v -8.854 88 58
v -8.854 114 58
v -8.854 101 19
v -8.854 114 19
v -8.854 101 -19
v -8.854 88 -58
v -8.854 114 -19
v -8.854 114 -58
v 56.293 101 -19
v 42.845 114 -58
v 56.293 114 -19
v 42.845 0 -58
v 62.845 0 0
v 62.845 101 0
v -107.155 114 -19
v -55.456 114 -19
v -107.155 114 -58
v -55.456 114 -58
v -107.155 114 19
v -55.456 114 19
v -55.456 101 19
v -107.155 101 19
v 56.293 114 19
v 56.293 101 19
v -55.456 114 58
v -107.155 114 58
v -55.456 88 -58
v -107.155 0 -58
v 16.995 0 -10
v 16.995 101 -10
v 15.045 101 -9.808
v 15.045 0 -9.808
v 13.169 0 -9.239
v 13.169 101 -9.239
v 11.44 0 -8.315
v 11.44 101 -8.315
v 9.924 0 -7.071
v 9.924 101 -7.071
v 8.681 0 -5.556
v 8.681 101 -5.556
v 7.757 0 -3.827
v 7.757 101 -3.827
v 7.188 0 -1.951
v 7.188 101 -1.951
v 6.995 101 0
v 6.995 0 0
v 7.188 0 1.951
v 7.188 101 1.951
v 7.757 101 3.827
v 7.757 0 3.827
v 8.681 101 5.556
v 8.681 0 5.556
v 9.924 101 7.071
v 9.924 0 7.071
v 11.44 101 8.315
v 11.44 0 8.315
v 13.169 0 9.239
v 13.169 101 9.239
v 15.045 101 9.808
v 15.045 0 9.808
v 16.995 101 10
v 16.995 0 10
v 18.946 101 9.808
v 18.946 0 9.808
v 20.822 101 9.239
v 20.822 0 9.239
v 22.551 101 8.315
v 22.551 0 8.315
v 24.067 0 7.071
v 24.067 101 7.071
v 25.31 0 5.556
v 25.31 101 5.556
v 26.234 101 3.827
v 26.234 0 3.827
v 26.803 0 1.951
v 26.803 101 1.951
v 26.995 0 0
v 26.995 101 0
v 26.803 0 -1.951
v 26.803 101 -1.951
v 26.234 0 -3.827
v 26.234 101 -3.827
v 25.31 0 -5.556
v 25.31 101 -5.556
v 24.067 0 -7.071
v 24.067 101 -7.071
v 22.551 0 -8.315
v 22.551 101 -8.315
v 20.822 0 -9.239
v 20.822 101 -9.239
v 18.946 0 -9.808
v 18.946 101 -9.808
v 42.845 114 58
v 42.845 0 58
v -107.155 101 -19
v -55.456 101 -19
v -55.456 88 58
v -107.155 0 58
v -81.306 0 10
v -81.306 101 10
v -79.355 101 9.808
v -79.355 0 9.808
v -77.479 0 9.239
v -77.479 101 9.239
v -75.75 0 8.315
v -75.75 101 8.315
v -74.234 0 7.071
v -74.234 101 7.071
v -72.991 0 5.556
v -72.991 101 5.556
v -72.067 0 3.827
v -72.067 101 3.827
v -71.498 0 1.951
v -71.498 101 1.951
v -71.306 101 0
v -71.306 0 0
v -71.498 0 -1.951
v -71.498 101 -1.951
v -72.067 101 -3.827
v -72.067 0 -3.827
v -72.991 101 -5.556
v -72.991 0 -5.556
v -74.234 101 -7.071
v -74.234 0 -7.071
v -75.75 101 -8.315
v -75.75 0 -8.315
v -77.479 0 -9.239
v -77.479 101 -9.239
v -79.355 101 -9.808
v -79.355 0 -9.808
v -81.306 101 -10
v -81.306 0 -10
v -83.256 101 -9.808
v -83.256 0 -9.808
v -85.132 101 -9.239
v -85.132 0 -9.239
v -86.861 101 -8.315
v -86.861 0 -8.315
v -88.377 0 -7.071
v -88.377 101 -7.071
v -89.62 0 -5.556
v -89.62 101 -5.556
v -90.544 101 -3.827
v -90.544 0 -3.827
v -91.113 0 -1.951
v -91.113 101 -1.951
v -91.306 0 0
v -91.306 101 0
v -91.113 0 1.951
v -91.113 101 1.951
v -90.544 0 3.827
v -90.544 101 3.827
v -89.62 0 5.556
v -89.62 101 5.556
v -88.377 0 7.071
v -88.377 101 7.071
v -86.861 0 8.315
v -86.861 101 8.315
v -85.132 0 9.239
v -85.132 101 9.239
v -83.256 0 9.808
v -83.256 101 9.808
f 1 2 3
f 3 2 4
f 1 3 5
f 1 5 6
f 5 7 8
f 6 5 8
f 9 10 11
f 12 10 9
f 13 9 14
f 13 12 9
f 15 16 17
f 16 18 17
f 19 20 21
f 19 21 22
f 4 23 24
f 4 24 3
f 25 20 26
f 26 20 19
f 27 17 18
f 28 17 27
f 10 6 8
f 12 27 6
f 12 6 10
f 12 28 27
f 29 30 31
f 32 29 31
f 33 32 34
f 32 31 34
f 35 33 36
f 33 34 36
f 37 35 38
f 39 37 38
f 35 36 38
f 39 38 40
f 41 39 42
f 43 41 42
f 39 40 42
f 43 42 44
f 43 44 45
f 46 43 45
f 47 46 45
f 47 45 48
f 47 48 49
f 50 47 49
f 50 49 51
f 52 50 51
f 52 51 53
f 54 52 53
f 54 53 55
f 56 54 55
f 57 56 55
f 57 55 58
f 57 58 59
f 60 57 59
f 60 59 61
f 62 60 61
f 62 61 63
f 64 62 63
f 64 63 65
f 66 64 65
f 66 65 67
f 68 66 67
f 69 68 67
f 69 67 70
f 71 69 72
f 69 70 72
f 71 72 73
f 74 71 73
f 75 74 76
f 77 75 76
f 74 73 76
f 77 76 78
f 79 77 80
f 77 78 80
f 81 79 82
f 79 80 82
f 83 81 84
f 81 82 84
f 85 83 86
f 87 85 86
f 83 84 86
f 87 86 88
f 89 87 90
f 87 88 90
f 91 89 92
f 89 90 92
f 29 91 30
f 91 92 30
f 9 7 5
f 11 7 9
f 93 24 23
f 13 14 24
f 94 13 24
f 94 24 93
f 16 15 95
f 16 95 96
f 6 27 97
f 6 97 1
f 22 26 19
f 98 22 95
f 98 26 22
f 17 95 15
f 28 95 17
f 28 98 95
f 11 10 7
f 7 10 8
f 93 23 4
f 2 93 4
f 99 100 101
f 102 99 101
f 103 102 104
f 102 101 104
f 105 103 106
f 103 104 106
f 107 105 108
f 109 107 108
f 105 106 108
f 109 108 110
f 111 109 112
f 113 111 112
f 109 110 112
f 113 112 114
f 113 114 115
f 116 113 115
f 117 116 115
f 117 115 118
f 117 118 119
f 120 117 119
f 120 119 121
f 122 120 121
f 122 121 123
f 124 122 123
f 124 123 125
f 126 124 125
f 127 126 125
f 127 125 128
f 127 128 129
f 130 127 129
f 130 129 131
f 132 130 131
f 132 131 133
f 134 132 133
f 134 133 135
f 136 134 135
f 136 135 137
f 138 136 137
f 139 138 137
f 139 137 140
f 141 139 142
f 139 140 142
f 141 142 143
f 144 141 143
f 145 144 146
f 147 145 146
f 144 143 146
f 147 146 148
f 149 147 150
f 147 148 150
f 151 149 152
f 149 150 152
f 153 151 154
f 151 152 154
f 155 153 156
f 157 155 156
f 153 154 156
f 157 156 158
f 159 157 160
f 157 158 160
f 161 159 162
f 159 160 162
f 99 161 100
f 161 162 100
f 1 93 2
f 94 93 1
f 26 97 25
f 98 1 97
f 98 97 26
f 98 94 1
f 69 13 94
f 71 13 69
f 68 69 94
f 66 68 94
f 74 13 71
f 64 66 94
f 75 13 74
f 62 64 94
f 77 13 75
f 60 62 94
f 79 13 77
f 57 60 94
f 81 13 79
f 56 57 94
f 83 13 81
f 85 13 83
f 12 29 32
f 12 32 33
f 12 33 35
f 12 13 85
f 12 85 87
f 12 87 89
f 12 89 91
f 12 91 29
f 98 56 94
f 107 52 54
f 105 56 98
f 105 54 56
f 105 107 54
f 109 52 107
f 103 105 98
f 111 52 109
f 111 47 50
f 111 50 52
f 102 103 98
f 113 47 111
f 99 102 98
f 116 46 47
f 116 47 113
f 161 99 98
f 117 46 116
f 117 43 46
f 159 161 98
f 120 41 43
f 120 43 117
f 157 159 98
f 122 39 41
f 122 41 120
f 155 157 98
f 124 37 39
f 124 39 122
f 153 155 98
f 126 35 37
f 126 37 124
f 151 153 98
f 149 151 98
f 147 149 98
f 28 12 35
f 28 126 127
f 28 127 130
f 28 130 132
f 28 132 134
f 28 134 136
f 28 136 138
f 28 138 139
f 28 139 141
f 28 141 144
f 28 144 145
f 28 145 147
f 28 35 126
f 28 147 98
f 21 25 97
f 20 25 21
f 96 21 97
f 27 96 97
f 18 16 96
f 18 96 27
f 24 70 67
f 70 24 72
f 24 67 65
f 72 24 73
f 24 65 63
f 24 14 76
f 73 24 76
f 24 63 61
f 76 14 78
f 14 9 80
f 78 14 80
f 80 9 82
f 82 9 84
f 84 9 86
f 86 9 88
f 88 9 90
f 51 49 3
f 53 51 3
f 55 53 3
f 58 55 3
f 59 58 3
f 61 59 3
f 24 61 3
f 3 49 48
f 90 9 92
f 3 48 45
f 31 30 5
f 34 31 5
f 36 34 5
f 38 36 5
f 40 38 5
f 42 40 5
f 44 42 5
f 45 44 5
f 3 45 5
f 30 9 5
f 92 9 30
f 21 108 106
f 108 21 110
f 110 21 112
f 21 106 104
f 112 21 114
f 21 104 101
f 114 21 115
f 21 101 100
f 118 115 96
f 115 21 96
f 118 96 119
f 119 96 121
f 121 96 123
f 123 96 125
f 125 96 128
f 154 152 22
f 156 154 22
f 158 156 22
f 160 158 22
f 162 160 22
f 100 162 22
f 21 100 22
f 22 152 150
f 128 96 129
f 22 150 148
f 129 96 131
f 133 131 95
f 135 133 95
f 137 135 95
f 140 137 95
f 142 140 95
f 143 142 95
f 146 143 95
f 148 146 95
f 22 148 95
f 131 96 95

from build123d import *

# Parameters (mm, degrees)
ESTRUSIONE_ESTRUSIONE1_DEPTH = 114
TAGLIO_ESTRUSIONE3_DEPTH     = 13
SCHIZZO6_W                   = 46.601982298
SCHIZZO6_H                   = 116
TAGLIO_ESTRUSIONE4_DEPTH     = 26
SCHIZZO7_R                   = 10
TAGLIO_ESTRUSIONE5_DEPTH     = 159.263069137


with BuildPart() as part:
    # Schizzo1 → Estrusione-Estrusione1 (new body)
    with BuildSketch(Plane(origin=(0, 0, 0), x_dir=(1, 0, 0), z_dir=(0, 1, 0))):
        Polygon((-107.155023459, -58), (-107.155023459, 58), (42.844976541, 58), (62.844976541, 0), (42.844976541, -58), align=None)
    extrude(amount=ESTRUSIONE_ESTRUSIONE1_DEPTH)

    # Schizzo3 → Taglio-Estrusione3 (cut)
    with BuildSketch(Plane(origin=(0, 114, 0), x_dir=(1, 0, 0), z_dir=(0, 1, 0))):
        Polygon((-107.155023459, -19), (-107.155023459, 19), (56.293252403, 19), (62.844976541, 0), (56.293252403, -19), align=None)
    extrude(amount=-TAGLIO_ESTRUSIONE3_DEPTH, mode=Mode.SUBTRACT)

    # Schizzo6 → Taglio-Estrusione4 (cut)
    with BuildSketch(Plane(origin=(0, 114, 0), x_dir=(1, 0, 0), z_dir=(0, 1, 0))):
        with Locations((-32.155023459, 0)):
            Rectangle(SCHIZZO6_W, SCHIZZO6_H)
    extrude(amount=-TAGLIO_ESTRUSIONE4_DEPTH, mode=Mode.SUBTRACT)

    # Schizzo7 → Taglio-Estrusione5 (cut, through all)
    with BuildSketch(Plane(origin=(0, 101, 0), x_dir=(1, 0, 0), z_dir=(0, 1, 0))):
        with Locations(Location((-81.305519034, 0, 0), (0, 0, 270))):
            Circle(SCHIZZO7_R)
        with Locations(Location((16.995472115, 0, 0), (0, 0, 90))):
            Circle(SCHIZZO7_R)
    extrude(amount=-TAGLIO_ESTRUSIONE5_DEPTH, mode=Mode.SUBTRACT)


solid = part.part
